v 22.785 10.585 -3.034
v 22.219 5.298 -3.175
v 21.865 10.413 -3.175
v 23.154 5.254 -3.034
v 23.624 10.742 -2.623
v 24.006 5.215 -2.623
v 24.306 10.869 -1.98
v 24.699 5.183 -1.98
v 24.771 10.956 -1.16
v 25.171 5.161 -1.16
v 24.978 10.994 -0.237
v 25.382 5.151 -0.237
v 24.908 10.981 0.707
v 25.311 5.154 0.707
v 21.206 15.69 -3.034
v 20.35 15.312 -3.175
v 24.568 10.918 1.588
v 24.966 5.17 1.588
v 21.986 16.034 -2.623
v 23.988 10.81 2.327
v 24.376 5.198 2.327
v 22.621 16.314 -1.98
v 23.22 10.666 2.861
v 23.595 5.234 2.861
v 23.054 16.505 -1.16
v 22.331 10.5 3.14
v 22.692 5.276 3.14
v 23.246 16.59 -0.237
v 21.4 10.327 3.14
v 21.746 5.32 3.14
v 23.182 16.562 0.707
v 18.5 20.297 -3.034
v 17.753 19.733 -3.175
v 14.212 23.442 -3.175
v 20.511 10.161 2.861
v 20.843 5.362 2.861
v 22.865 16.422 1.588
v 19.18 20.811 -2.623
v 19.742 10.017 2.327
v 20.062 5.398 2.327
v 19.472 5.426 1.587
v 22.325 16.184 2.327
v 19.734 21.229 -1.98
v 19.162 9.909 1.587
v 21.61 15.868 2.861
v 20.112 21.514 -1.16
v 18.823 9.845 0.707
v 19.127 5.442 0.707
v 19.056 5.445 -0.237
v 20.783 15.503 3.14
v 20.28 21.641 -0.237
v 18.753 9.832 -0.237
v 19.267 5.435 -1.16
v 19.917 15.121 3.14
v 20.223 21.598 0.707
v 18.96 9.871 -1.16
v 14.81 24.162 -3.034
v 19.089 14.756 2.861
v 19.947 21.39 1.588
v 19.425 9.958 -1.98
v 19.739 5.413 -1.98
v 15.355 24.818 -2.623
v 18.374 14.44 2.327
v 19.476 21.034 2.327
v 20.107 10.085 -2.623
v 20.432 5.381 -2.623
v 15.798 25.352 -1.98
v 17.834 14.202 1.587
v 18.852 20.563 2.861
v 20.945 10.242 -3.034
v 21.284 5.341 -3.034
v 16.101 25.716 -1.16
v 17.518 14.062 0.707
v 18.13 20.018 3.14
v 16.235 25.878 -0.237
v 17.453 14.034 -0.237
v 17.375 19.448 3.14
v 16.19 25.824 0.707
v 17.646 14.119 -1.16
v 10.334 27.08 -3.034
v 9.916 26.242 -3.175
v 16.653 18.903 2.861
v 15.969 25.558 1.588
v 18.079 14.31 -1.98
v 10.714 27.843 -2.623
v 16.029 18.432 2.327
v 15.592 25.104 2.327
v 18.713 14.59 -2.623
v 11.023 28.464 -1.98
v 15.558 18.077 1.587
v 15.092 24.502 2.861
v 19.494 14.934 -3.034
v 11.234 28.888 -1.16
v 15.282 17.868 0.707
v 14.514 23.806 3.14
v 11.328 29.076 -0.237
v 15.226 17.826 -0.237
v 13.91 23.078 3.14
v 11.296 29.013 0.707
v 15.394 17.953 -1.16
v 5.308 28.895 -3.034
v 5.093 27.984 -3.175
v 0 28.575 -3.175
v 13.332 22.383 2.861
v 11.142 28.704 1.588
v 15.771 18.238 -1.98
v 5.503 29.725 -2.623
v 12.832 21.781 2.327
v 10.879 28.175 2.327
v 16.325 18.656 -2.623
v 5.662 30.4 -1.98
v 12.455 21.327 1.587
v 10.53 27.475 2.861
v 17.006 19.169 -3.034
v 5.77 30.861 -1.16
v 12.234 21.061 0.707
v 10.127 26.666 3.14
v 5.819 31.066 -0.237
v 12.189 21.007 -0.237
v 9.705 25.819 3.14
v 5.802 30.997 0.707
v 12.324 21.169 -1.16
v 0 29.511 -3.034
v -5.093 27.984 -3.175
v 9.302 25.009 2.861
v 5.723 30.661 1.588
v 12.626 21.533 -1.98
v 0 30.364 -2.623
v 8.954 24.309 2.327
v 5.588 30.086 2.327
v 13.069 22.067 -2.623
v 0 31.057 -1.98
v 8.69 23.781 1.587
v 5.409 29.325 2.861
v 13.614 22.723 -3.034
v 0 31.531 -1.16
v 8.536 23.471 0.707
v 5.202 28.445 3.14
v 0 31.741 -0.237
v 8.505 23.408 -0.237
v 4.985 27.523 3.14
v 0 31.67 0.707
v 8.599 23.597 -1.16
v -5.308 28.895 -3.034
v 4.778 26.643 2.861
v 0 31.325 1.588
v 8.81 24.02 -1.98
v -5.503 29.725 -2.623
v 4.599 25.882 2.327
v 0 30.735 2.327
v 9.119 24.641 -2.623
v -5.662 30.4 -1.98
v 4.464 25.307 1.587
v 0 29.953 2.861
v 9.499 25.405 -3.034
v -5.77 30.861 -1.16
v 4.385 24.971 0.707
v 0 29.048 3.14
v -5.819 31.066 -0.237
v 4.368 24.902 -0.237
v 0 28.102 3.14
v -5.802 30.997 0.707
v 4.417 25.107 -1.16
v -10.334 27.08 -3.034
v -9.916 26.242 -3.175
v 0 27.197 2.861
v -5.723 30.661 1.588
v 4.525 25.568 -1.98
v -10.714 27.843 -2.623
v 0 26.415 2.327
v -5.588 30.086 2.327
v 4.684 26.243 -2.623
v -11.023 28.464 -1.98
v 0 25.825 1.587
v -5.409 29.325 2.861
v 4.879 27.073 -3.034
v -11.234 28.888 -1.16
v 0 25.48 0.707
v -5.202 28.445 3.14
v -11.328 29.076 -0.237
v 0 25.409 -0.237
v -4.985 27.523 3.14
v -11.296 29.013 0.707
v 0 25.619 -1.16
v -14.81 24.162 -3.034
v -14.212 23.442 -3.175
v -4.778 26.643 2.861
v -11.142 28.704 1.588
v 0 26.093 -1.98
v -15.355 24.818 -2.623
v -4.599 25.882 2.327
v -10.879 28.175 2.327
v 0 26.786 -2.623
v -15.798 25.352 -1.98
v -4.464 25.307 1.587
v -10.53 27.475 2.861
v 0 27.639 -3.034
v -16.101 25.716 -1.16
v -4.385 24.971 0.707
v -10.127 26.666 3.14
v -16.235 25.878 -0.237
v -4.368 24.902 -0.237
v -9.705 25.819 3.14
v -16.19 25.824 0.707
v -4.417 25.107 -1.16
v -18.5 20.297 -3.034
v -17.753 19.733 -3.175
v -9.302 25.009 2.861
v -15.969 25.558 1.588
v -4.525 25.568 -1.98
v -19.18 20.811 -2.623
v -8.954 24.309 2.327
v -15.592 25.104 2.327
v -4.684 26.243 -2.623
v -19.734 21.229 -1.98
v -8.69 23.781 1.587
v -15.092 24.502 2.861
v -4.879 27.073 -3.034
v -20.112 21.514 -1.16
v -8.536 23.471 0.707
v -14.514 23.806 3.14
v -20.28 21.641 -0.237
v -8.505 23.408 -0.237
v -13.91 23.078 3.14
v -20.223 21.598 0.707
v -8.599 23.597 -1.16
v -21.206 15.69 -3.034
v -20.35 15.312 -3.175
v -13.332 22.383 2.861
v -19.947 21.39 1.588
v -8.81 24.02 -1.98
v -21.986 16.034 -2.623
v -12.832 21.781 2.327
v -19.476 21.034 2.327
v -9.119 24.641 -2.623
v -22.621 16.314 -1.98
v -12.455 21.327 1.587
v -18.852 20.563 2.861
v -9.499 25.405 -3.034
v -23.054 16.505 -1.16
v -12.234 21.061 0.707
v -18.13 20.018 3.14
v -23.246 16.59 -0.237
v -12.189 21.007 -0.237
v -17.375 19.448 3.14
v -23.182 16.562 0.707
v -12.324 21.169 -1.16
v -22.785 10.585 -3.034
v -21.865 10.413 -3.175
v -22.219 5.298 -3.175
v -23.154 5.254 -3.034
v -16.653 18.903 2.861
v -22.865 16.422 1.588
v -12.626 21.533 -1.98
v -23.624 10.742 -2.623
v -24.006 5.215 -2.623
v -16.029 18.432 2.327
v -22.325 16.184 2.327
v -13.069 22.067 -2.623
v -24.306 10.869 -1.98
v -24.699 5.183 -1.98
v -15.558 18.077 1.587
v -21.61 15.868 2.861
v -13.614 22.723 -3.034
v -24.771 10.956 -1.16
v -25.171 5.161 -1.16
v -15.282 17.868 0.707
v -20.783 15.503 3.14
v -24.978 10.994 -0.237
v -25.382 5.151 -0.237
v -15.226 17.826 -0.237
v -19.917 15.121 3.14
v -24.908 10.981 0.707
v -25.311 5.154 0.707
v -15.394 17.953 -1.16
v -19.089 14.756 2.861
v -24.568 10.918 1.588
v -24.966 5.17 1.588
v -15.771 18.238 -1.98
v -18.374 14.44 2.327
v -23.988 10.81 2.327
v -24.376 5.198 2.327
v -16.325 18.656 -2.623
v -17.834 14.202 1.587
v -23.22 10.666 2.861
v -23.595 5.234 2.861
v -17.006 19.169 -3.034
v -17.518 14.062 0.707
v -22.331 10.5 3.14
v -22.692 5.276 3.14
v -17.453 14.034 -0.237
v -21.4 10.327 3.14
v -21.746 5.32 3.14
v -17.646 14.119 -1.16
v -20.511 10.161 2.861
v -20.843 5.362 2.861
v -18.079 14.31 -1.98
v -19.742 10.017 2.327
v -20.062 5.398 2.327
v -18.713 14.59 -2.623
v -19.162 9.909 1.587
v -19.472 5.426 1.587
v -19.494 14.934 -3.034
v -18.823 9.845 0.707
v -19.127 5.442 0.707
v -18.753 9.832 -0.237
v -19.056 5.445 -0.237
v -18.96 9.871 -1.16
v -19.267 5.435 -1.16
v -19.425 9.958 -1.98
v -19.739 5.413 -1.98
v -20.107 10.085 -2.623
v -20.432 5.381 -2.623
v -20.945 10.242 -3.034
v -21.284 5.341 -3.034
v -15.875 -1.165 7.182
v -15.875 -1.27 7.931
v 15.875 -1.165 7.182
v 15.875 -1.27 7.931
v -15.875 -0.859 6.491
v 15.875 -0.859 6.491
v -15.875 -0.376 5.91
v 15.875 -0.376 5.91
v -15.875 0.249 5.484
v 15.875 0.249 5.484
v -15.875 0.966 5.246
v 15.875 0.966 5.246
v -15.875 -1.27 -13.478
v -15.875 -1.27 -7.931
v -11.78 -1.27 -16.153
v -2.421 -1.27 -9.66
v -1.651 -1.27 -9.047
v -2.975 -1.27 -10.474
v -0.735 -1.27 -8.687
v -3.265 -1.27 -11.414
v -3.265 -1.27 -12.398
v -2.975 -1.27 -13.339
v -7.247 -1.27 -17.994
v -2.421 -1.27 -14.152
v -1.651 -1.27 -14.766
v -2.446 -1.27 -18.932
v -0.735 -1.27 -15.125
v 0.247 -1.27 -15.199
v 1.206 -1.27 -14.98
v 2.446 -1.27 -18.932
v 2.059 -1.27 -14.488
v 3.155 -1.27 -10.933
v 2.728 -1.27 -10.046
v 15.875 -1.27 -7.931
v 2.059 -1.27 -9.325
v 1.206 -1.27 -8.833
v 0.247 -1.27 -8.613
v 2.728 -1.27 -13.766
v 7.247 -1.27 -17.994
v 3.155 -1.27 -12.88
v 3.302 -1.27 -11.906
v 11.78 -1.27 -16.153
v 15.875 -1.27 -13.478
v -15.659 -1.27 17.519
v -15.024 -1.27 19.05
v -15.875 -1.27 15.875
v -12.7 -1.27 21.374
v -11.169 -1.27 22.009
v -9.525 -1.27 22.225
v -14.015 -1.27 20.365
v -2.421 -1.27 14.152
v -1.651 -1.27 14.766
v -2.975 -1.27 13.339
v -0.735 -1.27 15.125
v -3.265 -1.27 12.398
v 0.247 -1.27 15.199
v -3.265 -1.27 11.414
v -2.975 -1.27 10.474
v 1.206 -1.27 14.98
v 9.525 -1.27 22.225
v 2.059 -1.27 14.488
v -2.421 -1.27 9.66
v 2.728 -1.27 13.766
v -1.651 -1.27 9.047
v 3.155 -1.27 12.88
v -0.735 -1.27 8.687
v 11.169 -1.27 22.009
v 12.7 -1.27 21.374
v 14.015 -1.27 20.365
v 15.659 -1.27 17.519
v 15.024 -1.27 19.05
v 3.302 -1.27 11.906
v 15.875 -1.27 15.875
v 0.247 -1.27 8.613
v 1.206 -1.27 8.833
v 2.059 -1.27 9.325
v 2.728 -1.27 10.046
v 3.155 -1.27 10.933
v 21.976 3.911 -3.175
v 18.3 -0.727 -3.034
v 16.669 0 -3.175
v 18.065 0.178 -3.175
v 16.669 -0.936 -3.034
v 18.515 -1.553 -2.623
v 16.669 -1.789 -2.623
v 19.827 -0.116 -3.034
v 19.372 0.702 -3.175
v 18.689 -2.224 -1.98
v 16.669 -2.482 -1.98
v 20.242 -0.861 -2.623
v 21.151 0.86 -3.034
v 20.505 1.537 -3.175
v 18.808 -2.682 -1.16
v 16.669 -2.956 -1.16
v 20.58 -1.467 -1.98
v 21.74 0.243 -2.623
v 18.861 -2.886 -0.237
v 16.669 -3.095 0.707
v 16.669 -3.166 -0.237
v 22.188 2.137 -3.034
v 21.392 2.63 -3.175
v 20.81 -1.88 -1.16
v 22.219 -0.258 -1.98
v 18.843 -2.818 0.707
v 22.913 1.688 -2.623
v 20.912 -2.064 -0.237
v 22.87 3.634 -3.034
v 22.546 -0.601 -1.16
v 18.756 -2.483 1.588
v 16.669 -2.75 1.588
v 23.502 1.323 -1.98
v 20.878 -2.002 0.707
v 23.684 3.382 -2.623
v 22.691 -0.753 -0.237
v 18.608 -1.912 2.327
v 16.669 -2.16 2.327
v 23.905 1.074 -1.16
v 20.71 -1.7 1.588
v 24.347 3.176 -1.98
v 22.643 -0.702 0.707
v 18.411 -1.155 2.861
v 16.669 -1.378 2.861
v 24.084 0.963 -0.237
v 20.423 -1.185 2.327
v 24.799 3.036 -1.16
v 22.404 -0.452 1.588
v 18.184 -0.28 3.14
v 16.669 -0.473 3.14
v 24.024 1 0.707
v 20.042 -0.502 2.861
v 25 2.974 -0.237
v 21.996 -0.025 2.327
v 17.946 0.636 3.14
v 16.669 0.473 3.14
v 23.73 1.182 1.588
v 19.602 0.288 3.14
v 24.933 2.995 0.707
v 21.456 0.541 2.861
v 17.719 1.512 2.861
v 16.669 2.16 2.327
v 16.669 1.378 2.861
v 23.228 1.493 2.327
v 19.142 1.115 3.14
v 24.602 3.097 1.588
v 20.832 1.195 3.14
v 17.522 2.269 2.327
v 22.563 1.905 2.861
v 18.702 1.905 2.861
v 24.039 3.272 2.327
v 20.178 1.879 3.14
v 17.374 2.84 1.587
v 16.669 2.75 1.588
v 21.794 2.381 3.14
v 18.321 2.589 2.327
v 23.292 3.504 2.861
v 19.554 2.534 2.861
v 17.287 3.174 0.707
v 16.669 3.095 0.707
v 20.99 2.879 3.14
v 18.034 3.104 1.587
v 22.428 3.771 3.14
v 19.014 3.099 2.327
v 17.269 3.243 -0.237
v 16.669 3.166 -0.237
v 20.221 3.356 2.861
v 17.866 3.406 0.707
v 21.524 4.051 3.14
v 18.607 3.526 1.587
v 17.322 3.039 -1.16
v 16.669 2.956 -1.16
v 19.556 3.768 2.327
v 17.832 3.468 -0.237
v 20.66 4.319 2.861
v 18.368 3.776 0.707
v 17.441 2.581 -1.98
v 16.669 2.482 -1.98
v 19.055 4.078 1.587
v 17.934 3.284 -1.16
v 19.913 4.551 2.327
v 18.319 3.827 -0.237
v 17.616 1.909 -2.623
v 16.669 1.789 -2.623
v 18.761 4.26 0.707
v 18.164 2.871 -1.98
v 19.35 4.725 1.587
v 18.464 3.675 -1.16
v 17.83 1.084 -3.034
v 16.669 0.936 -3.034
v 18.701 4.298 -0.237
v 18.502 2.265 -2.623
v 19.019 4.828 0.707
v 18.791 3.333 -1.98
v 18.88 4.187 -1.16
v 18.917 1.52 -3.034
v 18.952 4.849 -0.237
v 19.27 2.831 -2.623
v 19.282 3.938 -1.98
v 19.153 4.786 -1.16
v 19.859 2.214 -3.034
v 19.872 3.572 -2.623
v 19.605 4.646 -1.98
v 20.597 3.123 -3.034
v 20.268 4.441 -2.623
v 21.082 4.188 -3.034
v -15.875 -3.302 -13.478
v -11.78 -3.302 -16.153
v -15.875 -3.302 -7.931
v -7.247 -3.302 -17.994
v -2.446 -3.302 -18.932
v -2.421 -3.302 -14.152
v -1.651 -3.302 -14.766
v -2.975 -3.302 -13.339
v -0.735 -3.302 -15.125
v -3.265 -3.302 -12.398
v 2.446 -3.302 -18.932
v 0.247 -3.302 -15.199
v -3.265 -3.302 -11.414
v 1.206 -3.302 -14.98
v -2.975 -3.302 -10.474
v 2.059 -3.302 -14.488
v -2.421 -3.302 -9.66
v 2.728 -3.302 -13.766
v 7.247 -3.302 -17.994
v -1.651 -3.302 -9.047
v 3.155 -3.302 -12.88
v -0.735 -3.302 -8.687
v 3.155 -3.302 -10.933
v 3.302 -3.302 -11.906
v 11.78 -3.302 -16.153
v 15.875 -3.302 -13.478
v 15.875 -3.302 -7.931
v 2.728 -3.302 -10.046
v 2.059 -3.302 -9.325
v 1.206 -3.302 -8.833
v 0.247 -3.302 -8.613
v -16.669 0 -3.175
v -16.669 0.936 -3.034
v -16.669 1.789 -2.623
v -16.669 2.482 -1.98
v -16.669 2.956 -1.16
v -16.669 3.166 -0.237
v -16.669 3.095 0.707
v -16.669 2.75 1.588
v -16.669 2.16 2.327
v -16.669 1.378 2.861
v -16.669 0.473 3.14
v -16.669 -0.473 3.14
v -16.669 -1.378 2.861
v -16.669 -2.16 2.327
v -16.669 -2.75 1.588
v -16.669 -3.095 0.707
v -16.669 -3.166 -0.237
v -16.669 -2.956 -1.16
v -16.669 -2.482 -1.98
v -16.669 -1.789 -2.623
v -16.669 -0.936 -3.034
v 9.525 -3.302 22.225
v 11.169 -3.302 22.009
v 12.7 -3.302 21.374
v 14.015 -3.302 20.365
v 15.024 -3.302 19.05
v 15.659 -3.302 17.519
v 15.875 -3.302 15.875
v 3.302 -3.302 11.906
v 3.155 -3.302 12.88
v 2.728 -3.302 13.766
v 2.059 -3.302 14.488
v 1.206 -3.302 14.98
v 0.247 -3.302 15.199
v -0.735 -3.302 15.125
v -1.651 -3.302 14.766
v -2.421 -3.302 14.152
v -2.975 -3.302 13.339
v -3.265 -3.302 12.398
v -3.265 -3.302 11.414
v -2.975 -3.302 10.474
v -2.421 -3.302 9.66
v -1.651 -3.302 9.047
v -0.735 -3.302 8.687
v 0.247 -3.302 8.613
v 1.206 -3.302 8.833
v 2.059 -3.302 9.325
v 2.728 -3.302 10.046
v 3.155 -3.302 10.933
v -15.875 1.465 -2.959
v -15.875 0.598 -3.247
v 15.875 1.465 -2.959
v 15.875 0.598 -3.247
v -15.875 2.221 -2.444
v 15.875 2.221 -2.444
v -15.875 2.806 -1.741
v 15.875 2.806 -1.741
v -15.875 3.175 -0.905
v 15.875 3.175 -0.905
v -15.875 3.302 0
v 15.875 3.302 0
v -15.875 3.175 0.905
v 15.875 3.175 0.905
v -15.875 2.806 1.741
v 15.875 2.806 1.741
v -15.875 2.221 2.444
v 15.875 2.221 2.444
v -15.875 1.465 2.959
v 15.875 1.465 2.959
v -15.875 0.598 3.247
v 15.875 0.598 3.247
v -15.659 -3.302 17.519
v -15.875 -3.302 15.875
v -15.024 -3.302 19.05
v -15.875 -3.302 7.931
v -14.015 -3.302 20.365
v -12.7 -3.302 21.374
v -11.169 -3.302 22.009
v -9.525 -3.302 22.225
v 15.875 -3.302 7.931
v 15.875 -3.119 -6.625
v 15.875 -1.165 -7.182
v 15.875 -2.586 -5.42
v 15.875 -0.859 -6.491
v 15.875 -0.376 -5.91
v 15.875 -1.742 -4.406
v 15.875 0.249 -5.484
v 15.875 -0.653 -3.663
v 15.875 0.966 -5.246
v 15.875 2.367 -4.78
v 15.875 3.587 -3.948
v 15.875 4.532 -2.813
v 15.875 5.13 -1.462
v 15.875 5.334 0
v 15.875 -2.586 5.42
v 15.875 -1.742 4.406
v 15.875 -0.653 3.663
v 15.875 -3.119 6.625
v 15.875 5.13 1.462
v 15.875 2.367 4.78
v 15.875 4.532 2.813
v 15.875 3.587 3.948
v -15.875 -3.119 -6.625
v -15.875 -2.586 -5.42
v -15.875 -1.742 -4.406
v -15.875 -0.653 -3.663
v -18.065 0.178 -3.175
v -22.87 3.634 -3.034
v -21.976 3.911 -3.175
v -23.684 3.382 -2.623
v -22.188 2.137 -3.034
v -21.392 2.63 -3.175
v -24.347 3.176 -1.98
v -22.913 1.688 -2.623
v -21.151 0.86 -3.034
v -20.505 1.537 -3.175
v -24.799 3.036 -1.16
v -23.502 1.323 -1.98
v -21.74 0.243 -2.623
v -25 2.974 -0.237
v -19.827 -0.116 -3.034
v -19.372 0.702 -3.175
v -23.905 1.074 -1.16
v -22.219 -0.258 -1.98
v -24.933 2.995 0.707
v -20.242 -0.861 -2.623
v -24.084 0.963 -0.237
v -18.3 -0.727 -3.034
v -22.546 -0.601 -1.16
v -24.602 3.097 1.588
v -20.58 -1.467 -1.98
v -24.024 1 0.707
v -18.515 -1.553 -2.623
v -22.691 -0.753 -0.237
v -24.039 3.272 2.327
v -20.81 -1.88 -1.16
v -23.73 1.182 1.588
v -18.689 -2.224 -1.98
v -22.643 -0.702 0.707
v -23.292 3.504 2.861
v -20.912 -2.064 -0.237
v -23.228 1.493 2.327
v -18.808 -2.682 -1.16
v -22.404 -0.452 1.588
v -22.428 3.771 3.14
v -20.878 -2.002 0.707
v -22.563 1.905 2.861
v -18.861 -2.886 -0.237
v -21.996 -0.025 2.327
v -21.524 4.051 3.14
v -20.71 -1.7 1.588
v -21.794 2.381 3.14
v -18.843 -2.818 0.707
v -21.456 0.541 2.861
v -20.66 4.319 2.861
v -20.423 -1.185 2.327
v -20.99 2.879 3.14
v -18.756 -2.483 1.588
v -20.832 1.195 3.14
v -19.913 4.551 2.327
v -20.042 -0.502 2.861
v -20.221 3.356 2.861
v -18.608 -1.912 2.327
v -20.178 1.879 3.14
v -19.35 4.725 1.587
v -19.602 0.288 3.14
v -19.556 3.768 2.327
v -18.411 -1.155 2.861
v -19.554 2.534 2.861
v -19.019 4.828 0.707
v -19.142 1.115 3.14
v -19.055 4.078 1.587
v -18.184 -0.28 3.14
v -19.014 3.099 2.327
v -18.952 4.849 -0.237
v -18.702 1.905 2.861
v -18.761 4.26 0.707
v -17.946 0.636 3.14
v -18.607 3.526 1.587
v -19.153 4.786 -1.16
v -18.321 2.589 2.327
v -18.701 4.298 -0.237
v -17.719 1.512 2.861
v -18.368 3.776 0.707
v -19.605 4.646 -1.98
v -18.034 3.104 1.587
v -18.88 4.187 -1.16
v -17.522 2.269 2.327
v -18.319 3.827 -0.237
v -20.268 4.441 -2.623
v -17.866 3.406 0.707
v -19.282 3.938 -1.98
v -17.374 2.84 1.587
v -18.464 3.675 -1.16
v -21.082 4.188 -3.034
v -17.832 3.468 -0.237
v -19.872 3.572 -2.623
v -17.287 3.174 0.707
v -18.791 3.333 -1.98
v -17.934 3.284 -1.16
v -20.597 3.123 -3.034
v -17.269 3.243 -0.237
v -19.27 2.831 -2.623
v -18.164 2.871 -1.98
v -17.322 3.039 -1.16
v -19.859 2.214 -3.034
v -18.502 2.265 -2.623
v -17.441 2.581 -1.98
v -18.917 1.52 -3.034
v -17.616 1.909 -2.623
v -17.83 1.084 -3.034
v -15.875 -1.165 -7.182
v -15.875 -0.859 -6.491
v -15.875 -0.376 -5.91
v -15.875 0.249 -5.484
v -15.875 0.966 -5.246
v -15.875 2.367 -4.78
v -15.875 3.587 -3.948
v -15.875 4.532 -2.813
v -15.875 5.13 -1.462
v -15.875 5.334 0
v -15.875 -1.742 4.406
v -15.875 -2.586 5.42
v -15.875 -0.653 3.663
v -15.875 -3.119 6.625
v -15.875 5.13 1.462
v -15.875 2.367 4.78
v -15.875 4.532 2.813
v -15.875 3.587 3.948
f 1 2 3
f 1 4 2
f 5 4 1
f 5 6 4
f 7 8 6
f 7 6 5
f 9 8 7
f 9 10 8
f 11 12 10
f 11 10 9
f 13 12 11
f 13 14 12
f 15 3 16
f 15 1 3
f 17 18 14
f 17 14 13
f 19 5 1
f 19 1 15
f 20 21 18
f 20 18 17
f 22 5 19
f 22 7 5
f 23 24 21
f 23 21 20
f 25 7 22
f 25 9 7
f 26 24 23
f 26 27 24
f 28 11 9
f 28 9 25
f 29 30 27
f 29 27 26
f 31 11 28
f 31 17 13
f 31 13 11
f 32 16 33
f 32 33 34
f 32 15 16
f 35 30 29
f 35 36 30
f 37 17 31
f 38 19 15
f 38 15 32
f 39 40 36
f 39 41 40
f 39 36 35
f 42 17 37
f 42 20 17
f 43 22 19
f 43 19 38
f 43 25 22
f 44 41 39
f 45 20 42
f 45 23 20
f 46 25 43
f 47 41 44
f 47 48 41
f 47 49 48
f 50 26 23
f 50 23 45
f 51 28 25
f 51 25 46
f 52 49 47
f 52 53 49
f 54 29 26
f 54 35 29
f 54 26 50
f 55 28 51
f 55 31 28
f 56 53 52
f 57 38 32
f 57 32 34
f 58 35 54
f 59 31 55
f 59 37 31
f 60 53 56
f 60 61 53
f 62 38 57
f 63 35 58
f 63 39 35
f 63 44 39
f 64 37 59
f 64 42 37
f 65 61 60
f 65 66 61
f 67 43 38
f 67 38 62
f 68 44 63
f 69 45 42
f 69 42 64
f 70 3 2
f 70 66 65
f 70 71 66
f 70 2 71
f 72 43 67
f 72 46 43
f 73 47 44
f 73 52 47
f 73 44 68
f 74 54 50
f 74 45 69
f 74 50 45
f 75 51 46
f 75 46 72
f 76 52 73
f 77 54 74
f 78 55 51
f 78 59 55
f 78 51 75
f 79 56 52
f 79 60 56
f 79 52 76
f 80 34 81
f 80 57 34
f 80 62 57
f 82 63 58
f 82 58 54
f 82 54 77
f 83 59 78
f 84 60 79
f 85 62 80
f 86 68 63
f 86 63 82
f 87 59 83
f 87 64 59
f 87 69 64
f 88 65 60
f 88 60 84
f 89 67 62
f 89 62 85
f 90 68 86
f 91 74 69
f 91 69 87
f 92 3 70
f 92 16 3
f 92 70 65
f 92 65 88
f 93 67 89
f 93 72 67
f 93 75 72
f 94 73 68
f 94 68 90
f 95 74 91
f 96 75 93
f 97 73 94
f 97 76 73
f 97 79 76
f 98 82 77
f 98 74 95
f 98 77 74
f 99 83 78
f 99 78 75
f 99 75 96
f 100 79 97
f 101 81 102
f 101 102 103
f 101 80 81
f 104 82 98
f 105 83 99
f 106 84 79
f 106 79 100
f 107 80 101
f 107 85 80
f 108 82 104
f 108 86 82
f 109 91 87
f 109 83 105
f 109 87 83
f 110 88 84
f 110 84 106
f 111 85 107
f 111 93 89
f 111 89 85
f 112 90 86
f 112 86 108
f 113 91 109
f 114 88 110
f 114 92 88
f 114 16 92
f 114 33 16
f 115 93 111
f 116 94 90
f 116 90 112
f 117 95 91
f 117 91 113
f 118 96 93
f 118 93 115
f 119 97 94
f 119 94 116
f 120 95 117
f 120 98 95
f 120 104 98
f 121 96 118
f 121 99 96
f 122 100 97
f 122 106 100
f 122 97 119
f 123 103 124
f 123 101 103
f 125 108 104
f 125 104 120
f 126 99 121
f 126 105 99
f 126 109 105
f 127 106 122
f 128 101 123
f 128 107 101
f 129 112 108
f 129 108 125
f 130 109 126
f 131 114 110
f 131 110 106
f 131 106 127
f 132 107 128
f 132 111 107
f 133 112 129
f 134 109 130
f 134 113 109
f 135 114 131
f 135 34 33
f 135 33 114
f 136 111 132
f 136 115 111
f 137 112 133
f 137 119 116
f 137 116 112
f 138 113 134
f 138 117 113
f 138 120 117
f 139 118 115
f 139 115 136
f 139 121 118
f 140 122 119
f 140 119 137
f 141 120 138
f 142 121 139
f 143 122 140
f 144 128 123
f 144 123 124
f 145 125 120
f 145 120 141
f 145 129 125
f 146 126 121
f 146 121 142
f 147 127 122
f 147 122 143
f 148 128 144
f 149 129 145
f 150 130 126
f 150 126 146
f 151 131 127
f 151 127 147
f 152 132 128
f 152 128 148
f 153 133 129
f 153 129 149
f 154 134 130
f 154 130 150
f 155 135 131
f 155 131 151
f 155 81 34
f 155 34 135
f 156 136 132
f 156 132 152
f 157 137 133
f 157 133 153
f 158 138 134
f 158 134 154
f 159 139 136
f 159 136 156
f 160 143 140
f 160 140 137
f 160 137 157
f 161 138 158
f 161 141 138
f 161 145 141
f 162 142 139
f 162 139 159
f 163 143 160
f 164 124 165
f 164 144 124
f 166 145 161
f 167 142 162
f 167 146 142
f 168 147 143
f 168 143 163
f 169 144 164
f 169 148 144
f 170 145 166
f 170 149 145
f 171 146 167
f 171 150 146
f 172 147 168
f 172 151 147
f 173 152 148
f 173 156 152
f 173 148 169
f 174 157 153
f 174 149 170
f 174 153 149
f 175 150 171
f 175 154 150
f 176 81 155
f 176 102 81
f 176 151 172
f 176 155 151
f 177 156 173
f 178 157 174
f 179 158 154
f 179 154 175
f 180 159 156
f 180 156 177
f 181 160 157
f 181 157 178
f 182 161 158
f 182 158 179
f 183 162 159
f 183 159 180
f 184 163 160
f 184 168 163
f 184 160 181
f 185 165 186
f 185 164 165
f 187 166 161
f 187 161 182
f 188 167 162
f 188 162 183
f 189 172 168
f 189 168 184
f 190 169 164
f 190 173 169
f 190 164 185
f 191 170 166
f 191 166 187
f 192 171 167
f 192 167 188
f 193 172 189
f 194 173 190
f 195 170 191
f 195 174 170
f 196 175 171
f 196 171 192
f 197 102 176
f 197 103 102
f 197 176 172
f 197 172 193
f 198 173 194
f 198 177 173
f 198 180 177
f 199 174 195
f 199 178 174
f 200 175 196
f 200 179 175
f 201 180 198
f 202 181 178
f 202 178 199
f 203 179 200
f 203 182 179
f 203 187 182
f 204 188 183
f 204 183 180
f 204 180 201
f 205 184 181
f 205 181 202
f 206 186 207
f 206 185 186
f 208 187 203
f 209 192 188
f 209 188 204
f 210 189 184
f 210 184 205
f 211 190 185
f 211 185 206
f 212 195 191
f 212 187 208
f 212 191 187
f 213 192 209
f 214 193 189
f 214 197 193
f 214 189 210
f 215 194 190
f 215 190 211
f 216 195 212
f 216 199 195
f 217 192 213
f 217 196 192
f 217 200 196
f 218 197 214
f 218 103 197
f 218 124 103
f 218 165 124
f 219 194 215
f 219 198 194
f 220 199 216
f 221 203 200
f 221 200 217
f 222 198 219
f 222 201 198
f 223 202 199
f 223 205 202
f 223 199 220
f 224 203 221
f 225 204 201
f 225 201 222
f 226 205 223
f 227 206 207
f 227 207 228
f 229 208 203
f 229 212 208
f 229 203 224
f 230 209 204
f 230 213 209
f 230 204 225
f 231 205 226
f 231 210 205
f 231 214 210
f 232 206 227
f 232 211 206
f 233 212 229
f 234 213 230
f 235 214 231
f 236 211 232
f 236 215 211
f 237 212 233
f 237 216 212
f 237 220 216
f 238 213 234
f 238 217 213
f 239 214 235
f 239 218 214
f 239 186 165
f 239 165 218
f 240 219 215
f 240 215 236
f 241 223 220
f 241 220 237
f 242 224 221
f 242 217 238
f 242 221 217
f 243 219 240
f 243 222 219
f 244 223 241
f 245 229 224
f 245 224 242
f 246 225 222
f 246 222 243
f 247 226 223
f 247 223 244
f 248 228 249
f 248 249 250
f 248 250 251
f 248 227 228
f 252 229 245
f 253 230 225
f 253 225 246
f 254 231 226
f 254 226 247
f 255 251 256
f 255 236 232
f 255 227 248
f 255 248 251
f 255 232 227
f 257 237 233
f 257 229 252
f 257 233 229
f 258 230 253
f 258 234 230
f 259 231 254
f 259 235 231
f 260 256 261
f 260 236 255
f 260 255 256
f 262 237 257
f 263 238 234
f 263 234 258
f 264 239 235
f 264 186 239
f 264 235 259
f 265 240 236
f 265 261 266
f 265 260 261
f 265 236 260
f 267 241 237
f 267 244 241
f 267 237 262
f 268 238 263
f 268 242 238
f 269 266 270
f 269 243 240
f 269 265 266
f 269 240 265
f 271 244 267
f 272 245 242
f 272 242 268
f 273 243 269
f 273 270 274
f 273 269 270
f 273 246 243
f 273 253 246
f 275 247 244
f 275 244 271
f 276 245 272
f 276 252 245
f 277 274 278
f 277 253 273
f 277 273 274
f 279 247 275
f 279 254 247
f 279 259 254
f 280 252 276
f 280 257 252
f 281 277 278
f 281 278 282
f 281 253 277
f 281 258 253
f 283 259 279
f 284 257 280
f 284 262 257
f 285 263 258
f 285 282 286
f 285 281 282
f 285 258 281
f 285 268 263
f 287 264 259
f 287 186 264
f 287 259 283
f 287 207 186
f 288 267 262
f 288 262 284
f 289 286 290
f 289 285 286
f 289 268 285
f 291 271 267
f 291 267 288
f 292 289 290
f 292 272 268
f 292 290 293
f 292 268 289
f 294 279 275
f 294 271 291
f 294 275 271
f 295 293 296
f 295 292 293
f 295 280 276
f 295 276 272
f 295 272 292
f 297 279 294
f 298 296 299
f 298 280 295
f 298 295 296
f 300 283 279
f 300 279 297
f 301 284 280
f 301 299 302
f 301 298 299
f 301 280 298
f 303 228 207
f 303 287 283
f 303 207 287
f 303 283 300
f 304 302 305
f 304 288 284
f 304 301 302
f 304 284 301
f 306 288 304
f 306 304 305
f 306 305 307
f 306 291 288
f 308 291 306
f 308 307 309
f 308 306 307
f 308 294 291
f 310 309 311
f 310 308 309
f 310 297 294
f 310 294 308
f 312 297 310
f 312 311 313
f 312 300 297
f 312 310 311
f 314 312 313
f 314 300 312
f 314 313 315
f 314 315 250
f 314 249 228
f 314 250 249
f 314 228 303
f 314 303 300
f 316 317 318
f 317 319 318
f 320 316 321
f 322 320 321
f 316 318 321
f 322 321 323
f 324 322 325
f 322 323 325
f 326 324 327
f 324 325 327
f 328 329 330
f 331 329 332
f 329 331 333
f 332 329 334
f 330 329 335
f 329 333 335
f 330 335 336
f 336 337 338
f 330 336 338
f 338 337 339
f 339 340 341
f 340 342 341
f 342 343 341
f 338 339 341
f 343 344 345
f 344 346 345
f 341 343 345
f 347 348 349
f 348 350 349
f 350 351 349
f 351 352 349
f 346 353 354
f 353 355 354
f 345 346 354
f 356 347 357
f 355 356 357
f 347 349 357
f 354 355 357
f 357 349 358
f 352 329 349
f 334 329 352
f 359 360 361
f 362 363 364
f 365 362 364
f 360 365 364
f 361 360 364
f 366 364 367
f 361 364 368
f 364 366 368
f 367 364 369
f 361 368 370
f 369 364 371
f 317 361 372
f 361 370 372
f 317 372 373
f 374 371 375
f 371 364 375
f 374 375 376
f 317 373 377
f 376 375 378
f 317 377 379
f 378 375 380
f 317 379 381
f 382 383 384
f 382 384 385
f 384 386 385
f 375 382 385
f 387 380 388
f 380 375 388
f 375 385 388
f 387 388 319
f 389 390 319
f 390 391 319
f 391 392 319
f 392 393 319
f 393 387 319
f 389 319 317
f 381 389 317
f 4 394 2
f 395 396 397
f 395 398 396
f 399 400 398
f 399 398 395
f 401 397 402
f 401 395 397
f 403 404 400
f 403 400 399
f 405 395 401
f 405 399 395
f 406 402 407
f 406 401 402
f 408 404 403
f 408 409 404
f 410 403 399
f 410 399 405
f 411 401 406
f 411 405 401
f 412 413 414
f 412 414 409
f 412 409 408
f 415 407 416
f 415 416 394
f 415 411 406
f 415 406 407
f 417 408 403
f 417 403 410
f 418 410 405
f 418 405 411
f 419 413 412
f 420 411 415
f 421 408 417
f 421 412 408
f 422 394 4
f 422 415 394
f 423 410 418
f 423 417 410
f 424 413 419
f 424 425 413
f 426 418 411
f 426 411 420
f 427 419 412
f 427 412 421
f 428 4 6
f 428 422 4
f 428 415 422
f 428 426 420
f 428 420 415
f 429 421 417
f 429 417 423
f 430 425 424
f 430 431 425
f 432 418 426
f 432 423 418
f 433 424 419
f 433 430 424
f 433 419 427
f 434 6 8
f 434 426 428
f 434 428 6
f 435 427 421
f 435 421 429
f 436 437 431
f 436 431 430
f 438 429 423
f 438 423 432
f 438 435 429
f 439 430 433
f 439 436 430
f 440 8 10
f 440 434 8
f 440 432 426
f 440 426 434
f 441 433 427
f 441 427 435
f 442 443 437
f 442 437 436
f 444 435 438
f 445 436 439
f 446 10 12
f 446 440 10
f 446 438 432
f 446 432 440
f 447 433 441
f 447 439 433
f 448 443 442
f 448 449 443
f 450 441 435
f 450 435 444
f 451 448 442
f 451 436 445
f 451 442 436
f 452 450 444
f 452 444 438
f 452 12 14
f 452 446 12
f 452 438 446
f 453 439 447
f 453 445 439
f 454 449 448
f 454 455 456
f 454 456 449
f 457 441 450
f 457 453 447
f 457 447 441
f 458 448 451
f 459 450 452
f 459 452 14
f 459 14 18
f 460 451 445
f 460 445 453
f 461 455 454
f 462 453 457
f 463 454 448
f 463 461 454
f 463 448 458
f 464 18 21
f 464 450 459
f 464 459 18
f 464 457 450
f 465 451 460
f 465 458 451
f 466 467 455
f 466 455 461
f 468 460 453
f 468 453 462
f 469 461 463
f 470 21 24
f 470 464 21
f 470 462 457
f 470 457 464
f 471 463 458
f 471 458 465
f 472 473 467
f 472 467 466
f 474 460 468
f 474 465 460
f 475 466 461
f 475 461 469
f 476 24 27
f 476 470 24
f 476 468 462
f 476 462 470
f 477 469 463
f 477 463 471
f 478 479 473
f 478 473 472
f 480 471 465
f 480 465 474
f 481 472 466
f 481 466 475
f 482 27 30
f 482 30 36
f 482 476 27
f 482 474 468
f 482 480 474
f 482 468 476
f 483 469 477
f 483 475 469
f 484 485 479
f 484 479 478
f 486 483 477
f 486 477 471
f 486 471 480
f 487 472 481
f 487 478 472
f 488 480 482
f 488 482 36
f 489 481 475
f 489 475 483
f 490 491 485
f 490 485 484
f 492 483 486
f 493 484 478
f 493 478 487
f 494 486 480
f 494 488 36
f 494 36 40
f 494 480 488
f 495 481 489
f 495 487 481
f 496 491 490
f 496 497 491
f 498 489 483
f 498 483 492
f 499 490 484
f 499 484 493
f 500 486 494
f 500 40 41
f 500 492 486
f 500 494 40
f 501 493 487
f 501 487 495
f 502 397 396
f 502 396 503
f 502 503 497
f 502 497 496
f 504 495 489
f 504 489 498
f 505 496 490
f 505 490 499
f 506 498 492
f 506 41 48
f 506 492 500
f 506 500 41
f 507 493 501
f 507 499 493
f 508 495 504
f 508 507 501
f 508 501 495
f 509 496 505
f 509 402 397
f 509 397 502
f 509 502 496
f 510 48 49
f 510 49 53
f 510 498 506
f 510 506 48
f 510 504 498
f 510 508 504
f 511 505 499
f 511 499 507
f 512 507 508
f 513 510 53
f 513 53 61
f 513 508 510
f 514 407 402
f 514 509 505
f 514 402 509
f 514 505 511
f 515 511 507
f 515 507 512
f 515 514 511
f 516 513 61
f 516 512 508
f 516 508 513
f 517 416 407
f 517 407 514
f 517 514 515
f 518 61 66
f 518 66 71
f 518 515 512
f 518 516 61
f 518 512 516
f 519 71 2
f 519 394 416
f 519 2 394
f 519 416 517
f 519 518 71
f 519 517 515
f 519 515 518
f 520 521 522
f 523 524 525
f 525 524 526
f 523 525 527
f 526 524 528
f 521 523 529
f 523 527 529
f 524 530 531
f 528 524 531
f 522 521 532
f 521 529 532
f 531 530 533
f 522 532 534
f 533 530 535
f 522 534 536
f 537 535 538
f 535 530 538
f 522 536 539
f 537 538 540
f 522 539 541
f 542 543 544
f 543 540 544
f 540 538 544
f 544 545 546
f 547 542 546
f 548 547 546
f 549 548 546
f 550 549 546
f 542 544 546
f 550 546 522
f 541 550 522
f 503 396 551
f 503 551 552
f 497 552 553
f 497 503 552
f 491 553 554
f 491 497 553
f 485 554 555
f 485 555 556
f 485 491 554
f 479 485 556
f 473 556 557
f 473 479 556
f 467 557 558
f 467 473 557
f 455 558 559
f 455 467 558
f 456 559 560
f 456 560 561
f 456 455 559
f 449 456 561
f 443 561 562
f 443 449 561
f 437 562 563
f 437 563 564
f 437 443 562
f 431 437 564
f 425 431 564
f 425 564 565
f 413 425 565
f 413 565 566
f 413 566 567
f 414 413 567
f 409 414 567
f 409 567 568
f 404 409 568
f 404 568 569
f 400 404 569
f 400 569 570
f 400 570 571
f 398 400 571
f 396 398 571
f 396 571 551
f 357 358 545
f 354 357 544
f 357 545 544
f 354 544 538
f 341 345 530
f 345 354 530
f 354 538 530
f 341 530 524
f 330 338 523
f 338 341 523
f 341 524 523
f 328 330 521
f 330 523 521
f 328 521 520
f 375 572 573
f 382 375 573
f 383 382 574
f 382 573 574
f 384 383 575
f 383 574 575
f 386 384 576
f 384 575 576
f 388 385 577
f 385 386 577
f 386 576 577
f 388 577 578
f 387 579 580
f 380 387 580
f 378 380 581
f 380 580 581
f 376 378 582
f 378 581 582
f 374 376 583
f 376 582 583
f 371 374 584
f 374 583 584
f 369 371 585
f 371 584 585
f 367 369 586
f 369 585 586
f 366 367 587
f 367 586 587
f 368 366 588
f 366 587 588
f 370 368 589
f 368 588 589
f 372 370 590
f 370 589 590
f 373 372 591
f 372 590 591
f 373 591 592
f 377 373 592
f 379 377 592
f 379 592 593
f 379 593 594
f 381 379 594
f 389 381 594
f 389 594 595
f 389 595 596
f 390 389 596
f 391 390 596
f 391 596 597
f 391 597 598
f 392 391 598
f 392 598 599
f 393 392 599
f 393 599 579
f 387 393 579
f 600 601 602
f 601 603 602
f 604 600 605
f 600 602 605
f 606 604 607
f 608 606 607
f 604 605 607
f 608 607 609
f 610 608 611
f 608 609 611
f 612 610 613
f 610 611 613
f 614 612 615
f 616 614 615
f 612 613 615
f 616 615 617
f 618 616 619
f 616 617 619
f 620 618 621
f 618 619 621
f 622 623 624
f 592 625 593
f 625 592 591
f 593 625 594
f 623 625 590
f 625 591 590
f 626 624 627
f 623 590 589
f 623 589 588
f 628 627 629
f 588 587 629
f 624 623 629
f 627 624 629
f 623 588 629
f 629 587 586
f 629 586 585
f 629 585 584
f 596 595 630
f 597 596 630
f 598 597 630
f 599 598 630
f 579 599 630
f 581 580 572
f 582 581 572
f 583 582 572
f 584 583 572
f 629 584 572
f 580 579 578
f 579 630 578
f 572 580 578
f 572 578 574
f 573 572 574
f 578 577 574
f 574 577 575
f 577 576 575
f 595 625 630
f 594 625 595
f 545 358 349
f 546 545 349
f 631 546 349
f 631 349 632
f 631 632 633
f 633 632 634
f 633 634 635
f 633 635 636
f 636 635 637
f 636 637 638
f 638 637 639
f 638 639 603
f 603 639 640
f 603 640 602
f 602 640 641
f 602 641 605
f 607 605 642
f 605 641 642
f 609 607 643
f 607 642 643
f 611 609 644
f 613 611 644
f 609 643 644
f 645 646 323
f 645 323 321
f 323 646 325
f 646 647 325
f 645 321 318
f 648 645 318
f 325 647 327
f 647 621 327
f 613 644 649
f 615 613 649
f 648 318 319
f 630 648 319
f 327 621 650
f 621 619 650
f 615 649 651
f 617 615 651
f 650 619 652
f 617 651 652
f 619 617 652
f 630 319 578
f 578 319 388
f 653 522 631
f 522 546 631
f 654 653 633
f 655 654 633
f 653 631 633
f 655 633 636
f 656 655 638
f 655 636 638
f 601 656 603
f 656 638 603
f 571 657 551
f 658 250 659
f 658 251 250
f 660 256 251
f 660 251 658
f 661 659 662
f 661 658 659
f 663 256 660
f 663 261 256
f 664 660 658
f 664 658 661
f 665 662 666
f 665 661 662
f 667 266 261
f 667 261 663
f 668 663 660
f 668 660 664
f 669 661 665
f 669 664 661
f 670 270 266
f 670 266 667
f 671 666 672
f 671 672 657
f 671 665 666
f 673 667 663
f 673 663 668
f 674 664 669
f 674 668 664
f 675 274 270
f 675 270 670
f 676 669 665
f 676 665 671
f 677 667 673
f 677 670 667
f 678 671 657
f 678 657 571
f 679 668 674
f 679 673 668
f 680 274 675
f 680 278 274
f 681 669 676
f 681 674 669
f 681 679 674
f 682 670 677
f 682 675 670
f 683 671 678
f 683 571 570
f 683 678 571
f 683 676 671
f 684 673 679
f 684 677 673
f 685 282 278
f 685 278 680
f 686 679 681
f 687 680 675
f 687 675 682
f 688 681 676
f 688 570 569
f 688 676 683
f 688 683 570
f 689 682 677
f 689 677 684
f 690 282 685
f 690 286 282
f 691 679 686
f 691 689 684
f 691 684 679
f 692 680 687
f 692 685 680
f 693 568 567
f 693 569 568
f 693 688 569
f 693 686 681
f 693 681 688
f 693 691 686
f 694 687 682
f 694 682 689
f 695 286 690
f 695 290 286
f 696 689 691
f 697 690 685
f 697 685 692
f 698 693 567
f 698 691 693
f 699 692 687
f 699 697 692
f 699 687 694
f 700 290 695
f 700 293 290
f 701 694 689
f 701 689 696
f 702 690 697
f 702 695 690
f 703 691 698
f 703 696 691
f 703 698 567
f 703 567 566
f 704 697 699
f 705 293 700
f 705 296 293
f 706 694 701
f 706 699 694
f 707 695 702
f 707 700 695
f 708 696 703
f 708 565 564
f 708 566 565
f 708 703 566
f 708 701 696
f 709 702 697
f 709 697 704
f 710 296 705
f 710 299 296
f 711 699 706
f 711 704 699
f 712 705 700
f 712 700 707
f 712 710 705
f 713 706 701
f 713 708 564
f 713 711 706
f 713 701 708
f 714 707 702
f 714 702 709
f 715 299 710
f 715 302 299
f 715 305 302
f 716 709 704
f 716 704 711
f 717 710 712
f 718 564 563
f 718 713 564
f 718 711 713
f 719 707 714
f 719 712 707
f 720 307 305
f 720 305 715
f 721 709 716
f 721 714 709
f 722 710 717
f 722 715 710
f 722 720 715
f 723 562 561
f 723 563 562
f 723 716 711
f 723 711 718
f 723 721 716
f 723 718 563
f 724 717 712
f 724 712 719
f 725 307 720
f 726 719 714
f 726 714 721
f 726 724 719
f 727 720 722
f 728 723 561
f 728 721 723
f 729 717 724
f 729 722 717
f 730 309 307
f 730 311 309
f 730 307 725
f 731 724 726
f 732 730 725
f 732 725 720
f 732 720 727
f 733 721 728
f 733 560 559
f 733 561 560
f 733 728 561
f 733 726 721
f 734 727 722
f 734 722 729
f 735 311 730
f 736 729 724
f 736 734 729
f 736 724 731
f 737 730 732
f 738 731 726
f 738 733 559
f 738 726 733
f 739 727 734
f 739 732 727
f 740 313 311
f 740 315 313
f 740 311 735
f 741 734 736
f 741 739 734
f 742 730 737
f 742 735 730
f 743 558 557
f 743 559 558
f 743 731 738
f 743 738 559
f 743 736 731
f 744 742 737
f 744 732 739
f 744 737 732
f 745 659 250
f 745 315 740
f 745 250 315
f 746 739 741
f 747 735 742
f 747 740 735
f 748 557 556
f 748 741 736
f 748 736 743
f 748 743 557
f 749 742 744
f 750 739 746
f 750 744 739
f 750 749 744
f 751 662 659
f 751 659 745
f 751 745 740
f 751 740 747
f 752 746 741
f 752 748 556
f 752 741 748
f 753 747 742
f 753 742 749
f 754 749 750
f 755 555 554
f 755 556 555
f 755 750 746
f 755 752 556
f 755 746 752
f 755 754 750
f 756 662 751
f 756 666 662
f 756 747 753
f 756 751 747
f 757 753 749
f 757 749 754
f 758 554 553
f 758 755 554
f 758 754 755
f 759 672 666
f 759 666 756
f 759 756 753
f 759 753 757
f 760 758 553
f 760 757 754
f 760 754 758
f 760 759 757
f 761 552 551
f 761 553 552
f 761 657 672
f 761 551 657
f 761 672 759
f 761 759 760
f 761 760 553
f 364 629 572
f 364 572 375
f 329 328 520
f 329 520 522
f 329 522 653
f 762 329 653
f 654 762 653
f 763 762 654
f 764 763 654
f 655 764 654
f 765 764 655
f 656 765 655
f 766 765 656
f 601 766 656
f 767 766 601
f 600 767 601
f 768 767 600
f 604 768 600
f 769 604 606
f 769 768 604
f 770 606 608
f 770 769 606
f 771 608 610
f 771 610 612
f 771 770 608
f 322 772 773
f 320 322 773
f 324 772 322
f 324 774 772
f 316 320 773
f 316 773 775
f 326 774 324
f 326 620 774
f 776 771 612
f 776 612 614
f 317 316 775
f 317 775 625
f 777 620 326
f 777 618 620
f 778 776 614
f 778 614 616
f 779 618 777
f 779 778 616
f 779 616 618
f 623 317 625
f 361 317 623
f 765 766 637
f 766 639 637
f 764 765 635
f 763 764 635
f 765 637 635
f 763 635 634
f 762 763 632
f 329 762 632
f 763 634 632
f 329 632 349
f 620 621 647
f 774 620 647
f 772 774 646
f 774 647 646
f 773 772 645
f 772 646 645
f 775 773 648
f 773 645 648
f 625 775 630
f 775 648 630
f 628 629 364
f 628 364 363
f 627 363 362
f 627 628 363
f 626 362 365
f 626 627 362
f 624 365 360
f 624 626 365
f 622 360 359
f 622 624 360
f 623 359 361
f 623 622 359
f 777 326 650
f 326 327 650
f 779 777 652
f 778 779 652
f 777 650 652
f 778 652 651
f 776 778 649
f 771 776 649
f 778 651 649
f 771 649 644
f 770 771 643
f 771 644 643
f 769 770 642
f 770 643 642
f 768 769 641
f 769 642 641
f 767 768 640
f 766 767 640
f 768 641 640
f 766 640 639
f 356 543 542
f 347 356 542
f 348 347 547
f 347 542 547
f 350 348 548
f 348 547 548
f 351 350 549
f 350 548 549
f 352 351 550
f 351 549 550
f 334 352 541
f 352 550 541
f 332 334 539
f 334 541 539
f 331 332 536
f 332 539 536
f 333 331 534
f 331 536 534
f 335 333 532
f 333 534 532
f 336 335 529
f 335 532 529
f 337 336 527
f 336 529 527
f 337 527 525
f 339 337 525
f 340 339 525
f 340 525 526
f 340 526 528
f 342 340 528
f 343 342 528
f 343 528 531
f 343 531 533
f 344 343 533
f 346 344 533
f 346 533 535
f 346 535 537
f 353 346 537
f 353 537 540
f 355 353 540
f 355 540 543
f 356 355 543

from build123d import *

# Parameters (mm, degrees)
SKETCH2_R           = 3.175
BOSS_EXTRUDE1_DEPTH = 15.875
SKETCH4_R           = 3.302
CUT_EXTRUDE1_DEPTH  = 36.0520001


with BuildPart() as part:
    # Sweep1: sweep along a path in Sketch1
    with BuildLine(Plane.XY) as sweep1_path:
        Line((-16.66875, 0), (16.66875, 0))
        ThreePointArc((16.66875, 0), (20.505205868, 1.537105758), (22.218993243, 5.297959459))
        ThreePointArc((22.218993243, 5.297959459), (0, 28.575), (-22.218993243, 5.297959459))
        ThreePointArc((-22.218993243, 5.297959459), (-20.505205868, 1.537105758), (-16.66875, 0))
    # Sketch2 → Sweep1 (sweep)
    with BuildSketch(Plane(origin=(0, 0, 0), x_dir=(0, 0, -1), z_dir=(1, 0, 0))):
        Circle(SKETCH2_R)
    sweep(path=sweep1_path.line)


with BuildPart() as body_2:
    # Sketch3 → Boss-Extrude1 (new body, symmetric)
    with BuildSketch(Plane(origin=(0, 0, 0), x_dir=(0, 0, -1), z_dir=(1, 0, 0))):
        with BuildLine():
            Line((-22.225, -3.302), (-22.225, -1.27))
            Line((-22.225, -1.27), (-7.931147458, -1.27))
            ThreePointArc((-7.931147458, -1.27), (-6.183949988, -0.637816289), (-5.245798319, 0.966))
            ThreePointArc((-5.245798319, 0.966), (0, 5.334), (5.245798319, 0.966))
            ThreePointArc((5.245798319, 0.966), (6.183949988, -0.637816289), (7.931147458, -1.27))
            Line((7.931147458, -1.27), (19.05, -1.27))
            Line((19.05, -1.27), (19.05, -3.302))
            Line((19.05, -3.302), (7.931147458, -3.302))
            ThreePointArc((7.931147458, -3.302), (4.88371001, -2.199353993), (3.247398959, 0.598))
            ThreePointArc((3.247398959, 0.598), (0, 3.302), (-3.247398959, 0.598))
            ThreePointArc((-3.247398959, 0.598), (-4.88371001, -2.199353993), (-7.931147458, -3.302))
            Line((-7.931147458, -3.302), (-22.225, -3.302))
        make_face()
    extrude(amount=BOSS_EXTRUDE1_DEPTH, both=True)

    # Sketch4 → Cut-Extrude1 (cut, through all)
    with BuildSketch(Plane.XZ.offset(3.302)):
        with Locations((0, 11.90625)):
            Circle(SKETCH4_R)
        with Locations((0, -11.90625)):
            Circle(SKETCH4_R)
        with BuildLine():
            Line((-15.875, 15.875), (-15.875, 22.225))
            Line((-15.875, 22.225), (-9.525, 22.225))
            ThreePointArc((-9.525, 22.225), (-14.015128061, 20.365128061), (-15.875, 15.875))
        make_face()
        with BuildLine():
            Line((15.875, 22.225), (9.525, 22.225))
            ThreePointArc((9.525, 22.225), (14.015128061, 20.365128061), (15.875, 15.875))
            Line((15.875, 15.875), (15.875, 22.225))
        make_face()
        with BuildLine():
            Line((15.875, -19.05), (15.875, -13.477868645))
            ThreePointArc((15.875, -13.477868645), (0, -19.05), (-15.875, -13.477868645))
            Line((-15.875, -13.477868645), (-15.875, -19.05))
            Line((-15.875, -19.05), (-15.875, -20.32))
            Line((-15.875, -20.32), (15.875, -20.32))
            Line((15.875, -20.32), (15.875, -19.05))
        make_face()
    extrude(amount=-CUT_EXTRUDE1_DEPTH, mode=Mode.SUBTRACT)


solid = Compound([part.part, body_2.part])
